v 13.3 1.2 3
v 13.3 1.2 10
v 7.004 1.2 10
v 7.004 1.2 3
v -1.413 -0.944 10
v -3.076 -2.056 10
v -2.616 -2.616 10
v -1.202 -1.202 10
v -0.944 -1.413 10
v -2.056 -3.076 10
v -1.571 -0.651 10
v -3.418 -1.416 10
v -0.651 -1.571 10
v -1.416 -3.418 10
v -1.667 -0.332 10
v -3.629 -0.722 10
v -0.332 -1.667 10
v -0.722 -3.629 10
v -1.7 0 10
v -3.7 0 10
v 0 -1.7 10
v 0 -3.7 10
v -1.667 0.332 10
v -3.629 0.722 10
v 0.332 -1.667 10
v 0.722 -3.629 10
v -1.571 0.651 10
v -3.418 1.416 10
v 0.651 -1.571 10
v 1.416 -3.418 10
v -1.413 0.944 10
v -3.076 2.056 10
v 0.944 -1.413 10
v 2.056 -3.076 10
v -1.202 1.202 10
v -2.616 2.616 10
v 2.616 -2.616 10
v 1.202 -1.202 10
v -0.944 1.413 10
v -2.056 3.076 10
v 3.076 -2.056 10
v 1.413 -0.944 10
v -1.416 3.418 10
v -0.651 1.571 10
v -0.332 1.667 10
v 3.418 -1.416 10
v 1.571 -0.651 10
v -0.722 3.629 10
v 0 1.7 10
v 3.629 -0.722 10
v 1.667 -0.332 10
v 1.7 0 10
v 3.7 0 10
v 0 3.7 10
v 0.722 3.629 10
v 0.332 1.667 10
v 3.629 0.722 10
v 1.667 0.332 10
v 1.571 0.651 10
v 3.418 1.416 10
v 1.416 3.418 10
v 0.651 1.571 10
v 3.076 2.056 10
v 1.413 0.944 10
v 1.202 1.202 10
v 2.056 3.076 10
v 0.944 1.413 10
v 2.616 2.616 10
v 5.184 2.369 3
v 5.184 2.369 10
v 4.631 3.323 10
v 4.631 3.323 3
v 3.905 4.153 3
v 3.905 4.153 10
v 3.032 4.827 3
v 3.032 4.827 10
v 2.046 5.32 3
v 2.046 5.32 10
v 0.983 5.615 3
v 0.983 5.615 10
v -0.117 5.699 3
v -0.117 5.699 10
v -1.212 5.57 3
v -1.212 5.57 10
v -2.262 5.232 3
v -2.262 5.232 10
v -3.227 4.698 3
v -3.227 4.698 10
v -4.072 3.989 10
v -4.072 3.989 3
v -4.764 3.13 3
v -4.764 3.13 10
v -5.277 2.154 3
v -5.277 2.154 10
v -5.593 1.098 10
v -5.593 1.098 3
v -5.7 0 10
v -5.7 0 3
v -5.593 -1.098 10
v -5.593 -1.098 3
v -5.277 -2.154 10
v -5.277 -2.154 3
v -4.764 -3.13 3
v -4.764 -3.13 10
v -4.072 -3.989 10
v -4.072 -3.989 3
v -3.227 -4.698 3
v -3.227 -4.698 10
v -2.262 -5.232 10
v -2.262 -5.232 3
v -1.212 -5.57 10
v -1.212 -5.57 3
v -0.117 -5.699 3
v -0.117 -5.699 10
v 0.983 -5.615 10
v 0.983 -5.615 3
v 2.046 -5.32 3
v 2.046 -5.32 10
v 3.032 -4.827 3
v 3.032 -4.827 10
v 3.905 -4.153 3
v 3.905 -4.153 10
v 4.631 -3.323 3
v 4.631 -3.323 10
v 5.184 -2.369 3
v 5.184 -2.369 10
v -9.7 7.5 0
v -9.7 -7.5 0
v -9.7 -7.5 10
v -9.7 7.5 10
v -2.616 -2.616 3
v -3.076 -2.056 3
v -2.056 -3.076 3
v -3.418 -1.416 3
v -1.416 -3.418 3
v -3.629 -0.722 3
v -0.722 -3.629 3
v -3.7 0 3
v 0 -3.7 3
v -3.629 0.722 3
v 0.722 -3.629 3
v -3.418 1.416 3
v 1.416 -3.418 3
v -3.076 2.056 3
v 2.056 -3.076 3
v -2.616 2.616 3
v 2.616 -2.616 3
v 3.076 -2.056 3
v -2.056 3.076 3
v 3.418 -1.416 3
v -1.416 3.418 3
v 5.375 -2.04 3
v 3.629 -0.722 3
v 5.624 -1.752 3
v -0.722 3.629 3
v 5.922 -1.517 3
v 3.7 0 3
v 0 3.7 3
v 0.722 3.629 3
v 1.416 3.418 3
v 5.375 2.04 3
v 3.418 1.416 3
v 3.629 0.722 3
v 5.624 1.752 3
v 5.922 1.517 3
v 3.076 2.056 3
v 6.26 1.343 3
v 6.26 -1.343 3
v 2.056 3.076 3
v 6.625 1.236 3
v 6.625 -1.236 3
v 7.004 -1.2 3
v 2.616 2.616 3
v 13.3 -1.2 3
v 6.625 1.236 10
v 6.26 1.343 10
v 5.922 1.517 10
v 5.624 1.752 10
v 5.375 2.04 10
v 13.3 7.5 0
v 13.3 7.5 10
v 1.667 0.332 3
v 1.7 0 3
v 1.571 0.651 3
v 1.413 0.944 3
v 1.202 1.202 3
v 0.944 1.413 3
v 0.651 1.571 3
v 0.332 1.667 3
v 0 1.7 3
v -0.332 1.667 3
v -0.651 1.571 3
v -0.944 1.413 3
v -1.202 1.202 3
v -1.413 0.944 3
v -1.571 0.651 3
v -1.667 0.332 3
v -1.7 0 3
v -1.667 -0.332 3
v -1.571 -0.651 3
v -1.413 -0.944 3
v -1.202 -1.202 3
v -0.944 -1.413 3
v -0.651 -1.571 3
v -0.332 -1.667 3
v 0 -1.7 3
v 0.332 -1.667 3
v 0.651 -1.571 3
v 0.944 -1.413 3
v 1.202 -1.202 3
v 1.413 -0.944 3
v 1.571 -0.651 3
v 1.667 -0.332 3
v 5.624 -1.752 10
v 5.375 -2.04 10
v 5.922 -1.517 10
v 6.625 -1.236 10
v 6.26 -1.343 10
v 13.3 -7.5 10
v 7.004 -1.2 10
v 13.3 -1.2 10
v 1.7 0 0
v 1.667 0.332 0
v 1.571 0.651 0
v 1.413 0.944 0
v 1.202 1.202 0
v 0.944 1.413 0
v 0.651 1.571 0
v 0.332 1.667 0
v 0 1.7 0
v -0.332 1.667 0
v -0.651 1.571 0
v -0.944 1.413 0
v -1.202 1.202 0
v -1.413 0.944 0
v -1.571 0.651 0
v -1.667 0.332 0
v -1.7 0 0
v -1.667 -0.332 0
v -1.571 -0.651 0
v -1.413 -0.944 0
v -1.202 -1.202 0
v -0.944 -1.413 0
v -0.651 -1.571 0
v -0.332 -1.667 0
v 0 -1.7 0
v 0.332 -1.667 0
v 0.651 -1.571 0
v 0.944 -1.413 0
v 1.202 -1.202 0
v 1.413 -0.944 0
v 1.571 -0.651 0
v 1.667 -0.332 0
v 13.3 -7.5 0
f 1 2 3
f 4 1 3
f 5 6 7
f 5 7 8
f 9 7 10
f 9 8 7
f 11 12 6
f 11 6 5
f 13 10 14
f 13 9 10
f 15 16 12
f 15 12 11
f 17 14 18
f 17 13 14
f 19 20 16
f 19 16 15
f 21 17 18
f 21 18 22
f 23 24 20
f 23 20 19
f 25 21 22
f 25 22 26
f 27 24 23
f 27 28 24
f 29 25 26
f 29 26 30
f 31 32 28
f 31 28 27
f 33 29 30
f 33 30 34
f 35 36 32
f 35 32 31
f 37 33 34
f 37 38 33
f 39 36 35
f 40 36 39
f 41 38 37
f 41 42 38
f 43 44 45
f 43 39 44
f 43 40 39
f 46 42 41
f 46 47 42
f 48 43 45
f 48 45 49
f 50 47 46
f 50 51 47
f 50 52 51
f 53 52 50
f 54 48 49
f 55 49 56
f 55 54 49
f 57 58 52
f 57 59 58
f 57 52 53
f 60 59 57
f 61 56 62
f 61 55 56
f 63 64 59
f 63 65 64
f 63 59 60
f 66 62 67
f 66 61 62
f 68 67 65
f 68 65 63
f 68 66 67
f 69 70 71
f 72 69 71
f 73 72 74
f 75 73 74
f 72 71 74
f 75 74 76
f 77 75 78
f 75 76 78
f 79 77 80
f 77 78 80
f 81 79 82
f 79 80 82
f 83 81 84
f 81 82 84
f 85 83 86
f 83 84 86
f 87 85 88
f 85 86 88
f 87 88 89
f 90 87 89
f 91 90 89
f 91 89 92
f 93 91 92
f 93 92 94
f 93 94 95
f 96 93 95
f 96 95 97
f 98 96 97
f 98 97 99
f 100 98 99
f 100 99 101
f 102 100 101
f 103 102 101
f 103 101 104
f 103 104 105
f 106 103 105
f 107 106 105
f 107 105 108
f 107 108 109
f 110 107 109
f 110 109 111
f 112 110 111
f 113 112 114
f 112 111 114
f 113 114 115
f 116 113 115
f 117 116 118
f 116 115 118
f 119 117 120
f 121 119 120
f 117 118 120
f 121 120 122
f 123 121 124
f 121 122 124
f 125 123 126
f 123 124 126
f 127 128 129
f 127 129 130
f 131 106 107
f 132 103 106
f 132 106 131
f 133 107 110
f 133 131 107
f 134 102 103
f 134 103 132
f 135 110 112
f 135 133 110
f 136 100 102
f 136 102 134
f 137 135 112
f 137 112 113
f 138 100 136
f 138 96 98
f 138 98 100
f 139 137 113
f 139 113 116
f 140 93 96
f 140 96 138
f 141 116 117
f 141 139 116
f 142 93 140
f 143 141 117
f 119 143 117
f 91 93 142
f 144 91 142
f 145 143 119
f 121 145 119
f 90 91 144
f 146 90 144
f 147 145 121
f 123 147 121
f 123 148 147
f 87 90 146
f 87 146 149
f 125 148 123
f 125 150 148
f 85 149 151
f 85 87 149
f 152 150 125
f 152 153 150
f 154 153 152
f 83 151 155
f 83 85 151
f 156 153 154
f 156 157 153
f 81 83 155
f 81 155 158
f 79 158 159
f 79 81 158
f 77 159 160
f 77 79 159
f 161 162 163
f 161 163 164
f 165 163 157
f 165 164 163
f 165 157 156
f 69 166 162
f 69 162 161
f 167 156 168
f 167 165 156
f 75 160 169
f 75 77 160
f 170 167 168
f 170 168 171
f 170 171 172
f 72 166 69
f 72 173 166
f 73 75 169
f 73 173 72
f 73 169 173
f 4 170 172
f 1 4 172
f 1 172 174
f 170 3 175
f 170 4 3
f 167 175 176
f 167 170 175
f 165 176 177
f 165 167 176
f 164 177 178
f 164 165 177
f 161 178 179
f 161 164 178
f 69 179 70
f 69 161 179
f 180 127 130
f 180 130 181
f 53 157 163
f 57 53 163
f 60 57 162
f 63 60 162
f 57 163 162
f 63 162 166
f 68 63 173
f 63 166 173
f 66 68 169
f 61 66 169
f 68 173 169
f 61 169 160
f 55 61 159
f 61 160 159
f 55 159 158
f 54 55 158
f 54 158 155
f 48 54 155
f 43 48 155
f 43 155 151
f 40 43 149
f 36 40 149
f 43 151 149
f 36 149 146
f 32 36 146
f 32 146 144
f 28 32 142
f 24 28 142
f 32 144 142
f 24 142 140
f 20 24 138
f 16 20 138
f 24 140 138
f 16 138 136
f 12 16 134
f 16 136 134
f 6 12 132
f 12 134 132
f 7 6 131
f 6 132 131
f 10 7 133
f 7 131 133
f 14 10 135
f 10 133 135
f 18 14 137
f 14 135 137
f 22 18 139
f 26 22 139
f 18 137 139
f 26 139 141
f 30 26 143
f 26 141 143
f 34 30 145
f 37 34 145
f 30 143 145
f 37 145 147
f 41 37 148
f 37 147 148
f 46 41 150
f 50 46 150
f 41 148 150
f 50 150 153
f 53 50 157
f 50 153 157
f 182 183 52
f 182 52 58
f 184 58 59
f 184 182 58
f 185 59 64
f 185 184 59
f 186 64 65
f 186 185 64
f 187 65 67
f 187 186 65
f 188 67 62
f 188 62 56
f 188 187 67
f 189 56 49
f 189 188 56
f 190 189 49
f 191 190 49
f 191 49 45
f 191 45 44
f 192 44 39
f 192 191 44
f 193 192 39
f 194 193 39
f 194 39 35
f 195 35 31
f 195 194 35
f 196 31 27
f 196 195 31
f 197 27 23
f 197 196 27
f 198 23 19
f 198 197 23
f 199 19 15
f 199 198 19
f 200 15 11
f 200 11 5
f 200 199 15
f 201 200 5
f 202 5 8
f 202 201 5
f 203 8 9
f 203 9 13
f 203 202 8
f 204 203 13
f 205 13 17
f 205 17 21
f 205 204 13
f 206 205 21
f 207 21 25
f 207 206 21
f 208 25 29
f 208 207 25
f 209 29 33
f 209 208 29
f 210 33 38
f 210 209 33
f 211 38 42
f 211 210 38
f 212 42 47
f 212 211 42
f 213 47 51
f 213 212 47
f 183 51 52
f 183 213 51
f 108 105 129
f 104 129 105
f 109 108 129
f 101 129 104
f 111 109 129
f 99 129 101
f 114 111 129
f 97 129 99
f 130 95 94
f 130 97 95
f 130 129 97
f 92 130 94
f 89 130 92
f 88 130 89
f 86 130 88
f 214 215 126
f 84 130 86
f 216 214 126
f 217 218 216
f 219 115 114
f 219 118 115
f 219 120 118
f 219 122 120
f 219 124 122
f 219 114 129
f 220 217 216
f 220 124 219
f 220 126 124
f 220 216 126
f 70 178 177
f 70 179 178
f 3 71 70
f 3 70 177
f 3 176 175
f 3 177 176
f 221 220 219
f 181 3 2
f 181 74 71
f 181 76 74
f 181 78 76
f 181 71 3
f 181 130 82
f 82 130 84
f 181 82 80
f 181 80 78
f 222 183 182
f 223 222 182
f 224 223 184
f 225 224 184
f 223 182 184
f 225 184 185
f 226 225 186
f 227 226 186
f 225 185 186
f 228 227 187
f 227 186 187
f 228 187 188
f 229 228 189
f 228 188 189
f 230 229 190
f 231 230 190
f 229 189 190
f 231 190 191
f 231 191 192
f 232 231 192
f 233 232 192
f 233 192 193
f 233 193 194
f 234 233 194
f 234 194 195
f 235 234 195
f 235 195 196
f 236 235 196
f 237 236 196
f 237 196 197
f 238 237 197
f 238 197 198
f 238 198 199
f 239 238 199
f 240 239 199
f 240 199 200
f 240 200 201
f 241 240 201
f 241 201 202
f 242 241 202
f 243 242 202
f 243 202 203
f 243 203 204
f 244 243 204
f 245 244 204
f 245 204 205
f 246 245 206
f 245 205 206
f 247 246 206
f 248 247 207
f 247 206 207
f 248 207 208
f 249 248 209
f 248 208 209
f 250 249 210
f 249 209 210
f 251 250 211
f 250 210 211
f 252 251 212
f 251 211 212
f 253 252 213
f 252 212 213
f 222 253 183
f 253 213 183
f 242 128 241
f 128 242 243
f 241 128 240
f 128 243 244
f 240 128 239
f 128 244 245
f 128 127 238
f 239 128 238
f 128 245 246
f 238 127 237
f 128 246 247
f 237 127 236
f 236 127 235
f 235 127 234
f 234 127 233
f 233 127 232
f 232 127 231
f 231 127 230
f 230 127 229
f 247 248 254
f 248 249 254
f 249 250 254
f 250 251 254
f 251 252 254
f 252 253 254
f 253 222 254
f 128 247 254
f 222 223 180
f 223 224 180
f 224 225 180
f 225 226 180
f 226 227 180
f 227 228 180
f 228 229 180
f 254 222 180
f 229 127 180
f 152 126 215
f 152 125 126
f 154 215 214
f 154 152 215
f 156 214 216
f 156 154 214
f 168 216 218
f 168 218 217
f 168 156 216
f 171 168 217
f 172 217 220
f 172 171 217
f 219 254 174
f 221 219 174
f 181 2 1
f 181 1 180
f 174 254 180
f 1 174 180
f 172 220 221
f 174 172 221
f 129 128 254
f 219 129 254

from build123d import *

# Parameters (mm, degrees)
F1_W     = 23
F1_H     = 15
F2_DEPTH = 10
F4_DEPTH = 7
F5_R     = 2
F6_R     = 3.7
F6_R_2   = 1.7
F7_DEPTH = 7
F8_DEPTH = 25


with BuildPart() as f2:
    # F1 (on Top) → F2 (new body)
    with BuildSketch(Plane.XY):
        with Locations((1.8, 0)):
            Rectangle(F1_W, F1_H)
    extrude(amount=F2_DEPTH)

    # F3 (on face) → F4 (cut)
    with BuildSketch(Plane.XY.offset(10)):
        with BuildLine():
            ThreePointArc((5.5722526863, -1.2), (5.6679731965, -0.6033902916), (5.7, 0))
            ThreePointArc((5.7, 0), (5.6679731965, 0.6033902916), (5.5722526863, 1.2))
            Line((5.5722526863, 1.2), (1.572670415, 1.2))
            Line((1.572670415, 1.2), (1.572670415, -1.2))
            Line((1.572670415, -1.2), (5.5722526863, -1.2))
        make_face()
        with BuildLine():
            ThreePointArc((5.5722526863, 1.2), (5.6679731965, 0.6033902916), (5.7, 0))
            ThreePointArc((5.7, 0), (5.6679731965, -0.6033902916), (5.5722526863, -1.2))
            Line((5.5722526863, -1.2), (15.8343315125, -1.2))
            Line((15.8343315125, -1.2), (15.8343315125, 1.2))
            Line((15.8343315125, 1.2), (5.5722526863, 1.2))
        make_face()
        with BuildLine():
            Line((1.572670415, 1.2), (5.5722526863, 1.2))
            ThreePointArc((5.5722526863, 1.2), (-5.7, 0), (5.5722526863, -1.2))
            Line((5.5722526863, -1.2), (1.572670415, -1.2))
            Line((1.572670415, -1.2), (1.572670415, 1.2))
        make_face()
    extrude(amount=-F4_DEPTH, mode=Mode.SUBTRACT)

    # F5
    f5_edges = [f2.edges().sort_by_distance(p)[0] for p in [
        (5.572253, 1.2, 6.5),
        (5.572253, -1.2, 6.5),
    ]]
    fillet(f5_edges, radius=F5_R)

    # F6 (on face) → F7 (join)
    with BuildSketch(Plane.XY.offset(3)):
        Circle(F6_R)
        Circle(F6_R_2, mode=Mode.SUBTRACT)
    extrude(amount=F7_DEPTH)

    # F8 (cut): a face of the model
    f8_faces = [f2.faces().sort_by_distance(p)[0] for p in [
        (0, 0, 3),
    ]]
    extrude(f8_faces, amount=-F8_DEPTH, mode=Mode.SUBTRACT)


solid = f2.part
